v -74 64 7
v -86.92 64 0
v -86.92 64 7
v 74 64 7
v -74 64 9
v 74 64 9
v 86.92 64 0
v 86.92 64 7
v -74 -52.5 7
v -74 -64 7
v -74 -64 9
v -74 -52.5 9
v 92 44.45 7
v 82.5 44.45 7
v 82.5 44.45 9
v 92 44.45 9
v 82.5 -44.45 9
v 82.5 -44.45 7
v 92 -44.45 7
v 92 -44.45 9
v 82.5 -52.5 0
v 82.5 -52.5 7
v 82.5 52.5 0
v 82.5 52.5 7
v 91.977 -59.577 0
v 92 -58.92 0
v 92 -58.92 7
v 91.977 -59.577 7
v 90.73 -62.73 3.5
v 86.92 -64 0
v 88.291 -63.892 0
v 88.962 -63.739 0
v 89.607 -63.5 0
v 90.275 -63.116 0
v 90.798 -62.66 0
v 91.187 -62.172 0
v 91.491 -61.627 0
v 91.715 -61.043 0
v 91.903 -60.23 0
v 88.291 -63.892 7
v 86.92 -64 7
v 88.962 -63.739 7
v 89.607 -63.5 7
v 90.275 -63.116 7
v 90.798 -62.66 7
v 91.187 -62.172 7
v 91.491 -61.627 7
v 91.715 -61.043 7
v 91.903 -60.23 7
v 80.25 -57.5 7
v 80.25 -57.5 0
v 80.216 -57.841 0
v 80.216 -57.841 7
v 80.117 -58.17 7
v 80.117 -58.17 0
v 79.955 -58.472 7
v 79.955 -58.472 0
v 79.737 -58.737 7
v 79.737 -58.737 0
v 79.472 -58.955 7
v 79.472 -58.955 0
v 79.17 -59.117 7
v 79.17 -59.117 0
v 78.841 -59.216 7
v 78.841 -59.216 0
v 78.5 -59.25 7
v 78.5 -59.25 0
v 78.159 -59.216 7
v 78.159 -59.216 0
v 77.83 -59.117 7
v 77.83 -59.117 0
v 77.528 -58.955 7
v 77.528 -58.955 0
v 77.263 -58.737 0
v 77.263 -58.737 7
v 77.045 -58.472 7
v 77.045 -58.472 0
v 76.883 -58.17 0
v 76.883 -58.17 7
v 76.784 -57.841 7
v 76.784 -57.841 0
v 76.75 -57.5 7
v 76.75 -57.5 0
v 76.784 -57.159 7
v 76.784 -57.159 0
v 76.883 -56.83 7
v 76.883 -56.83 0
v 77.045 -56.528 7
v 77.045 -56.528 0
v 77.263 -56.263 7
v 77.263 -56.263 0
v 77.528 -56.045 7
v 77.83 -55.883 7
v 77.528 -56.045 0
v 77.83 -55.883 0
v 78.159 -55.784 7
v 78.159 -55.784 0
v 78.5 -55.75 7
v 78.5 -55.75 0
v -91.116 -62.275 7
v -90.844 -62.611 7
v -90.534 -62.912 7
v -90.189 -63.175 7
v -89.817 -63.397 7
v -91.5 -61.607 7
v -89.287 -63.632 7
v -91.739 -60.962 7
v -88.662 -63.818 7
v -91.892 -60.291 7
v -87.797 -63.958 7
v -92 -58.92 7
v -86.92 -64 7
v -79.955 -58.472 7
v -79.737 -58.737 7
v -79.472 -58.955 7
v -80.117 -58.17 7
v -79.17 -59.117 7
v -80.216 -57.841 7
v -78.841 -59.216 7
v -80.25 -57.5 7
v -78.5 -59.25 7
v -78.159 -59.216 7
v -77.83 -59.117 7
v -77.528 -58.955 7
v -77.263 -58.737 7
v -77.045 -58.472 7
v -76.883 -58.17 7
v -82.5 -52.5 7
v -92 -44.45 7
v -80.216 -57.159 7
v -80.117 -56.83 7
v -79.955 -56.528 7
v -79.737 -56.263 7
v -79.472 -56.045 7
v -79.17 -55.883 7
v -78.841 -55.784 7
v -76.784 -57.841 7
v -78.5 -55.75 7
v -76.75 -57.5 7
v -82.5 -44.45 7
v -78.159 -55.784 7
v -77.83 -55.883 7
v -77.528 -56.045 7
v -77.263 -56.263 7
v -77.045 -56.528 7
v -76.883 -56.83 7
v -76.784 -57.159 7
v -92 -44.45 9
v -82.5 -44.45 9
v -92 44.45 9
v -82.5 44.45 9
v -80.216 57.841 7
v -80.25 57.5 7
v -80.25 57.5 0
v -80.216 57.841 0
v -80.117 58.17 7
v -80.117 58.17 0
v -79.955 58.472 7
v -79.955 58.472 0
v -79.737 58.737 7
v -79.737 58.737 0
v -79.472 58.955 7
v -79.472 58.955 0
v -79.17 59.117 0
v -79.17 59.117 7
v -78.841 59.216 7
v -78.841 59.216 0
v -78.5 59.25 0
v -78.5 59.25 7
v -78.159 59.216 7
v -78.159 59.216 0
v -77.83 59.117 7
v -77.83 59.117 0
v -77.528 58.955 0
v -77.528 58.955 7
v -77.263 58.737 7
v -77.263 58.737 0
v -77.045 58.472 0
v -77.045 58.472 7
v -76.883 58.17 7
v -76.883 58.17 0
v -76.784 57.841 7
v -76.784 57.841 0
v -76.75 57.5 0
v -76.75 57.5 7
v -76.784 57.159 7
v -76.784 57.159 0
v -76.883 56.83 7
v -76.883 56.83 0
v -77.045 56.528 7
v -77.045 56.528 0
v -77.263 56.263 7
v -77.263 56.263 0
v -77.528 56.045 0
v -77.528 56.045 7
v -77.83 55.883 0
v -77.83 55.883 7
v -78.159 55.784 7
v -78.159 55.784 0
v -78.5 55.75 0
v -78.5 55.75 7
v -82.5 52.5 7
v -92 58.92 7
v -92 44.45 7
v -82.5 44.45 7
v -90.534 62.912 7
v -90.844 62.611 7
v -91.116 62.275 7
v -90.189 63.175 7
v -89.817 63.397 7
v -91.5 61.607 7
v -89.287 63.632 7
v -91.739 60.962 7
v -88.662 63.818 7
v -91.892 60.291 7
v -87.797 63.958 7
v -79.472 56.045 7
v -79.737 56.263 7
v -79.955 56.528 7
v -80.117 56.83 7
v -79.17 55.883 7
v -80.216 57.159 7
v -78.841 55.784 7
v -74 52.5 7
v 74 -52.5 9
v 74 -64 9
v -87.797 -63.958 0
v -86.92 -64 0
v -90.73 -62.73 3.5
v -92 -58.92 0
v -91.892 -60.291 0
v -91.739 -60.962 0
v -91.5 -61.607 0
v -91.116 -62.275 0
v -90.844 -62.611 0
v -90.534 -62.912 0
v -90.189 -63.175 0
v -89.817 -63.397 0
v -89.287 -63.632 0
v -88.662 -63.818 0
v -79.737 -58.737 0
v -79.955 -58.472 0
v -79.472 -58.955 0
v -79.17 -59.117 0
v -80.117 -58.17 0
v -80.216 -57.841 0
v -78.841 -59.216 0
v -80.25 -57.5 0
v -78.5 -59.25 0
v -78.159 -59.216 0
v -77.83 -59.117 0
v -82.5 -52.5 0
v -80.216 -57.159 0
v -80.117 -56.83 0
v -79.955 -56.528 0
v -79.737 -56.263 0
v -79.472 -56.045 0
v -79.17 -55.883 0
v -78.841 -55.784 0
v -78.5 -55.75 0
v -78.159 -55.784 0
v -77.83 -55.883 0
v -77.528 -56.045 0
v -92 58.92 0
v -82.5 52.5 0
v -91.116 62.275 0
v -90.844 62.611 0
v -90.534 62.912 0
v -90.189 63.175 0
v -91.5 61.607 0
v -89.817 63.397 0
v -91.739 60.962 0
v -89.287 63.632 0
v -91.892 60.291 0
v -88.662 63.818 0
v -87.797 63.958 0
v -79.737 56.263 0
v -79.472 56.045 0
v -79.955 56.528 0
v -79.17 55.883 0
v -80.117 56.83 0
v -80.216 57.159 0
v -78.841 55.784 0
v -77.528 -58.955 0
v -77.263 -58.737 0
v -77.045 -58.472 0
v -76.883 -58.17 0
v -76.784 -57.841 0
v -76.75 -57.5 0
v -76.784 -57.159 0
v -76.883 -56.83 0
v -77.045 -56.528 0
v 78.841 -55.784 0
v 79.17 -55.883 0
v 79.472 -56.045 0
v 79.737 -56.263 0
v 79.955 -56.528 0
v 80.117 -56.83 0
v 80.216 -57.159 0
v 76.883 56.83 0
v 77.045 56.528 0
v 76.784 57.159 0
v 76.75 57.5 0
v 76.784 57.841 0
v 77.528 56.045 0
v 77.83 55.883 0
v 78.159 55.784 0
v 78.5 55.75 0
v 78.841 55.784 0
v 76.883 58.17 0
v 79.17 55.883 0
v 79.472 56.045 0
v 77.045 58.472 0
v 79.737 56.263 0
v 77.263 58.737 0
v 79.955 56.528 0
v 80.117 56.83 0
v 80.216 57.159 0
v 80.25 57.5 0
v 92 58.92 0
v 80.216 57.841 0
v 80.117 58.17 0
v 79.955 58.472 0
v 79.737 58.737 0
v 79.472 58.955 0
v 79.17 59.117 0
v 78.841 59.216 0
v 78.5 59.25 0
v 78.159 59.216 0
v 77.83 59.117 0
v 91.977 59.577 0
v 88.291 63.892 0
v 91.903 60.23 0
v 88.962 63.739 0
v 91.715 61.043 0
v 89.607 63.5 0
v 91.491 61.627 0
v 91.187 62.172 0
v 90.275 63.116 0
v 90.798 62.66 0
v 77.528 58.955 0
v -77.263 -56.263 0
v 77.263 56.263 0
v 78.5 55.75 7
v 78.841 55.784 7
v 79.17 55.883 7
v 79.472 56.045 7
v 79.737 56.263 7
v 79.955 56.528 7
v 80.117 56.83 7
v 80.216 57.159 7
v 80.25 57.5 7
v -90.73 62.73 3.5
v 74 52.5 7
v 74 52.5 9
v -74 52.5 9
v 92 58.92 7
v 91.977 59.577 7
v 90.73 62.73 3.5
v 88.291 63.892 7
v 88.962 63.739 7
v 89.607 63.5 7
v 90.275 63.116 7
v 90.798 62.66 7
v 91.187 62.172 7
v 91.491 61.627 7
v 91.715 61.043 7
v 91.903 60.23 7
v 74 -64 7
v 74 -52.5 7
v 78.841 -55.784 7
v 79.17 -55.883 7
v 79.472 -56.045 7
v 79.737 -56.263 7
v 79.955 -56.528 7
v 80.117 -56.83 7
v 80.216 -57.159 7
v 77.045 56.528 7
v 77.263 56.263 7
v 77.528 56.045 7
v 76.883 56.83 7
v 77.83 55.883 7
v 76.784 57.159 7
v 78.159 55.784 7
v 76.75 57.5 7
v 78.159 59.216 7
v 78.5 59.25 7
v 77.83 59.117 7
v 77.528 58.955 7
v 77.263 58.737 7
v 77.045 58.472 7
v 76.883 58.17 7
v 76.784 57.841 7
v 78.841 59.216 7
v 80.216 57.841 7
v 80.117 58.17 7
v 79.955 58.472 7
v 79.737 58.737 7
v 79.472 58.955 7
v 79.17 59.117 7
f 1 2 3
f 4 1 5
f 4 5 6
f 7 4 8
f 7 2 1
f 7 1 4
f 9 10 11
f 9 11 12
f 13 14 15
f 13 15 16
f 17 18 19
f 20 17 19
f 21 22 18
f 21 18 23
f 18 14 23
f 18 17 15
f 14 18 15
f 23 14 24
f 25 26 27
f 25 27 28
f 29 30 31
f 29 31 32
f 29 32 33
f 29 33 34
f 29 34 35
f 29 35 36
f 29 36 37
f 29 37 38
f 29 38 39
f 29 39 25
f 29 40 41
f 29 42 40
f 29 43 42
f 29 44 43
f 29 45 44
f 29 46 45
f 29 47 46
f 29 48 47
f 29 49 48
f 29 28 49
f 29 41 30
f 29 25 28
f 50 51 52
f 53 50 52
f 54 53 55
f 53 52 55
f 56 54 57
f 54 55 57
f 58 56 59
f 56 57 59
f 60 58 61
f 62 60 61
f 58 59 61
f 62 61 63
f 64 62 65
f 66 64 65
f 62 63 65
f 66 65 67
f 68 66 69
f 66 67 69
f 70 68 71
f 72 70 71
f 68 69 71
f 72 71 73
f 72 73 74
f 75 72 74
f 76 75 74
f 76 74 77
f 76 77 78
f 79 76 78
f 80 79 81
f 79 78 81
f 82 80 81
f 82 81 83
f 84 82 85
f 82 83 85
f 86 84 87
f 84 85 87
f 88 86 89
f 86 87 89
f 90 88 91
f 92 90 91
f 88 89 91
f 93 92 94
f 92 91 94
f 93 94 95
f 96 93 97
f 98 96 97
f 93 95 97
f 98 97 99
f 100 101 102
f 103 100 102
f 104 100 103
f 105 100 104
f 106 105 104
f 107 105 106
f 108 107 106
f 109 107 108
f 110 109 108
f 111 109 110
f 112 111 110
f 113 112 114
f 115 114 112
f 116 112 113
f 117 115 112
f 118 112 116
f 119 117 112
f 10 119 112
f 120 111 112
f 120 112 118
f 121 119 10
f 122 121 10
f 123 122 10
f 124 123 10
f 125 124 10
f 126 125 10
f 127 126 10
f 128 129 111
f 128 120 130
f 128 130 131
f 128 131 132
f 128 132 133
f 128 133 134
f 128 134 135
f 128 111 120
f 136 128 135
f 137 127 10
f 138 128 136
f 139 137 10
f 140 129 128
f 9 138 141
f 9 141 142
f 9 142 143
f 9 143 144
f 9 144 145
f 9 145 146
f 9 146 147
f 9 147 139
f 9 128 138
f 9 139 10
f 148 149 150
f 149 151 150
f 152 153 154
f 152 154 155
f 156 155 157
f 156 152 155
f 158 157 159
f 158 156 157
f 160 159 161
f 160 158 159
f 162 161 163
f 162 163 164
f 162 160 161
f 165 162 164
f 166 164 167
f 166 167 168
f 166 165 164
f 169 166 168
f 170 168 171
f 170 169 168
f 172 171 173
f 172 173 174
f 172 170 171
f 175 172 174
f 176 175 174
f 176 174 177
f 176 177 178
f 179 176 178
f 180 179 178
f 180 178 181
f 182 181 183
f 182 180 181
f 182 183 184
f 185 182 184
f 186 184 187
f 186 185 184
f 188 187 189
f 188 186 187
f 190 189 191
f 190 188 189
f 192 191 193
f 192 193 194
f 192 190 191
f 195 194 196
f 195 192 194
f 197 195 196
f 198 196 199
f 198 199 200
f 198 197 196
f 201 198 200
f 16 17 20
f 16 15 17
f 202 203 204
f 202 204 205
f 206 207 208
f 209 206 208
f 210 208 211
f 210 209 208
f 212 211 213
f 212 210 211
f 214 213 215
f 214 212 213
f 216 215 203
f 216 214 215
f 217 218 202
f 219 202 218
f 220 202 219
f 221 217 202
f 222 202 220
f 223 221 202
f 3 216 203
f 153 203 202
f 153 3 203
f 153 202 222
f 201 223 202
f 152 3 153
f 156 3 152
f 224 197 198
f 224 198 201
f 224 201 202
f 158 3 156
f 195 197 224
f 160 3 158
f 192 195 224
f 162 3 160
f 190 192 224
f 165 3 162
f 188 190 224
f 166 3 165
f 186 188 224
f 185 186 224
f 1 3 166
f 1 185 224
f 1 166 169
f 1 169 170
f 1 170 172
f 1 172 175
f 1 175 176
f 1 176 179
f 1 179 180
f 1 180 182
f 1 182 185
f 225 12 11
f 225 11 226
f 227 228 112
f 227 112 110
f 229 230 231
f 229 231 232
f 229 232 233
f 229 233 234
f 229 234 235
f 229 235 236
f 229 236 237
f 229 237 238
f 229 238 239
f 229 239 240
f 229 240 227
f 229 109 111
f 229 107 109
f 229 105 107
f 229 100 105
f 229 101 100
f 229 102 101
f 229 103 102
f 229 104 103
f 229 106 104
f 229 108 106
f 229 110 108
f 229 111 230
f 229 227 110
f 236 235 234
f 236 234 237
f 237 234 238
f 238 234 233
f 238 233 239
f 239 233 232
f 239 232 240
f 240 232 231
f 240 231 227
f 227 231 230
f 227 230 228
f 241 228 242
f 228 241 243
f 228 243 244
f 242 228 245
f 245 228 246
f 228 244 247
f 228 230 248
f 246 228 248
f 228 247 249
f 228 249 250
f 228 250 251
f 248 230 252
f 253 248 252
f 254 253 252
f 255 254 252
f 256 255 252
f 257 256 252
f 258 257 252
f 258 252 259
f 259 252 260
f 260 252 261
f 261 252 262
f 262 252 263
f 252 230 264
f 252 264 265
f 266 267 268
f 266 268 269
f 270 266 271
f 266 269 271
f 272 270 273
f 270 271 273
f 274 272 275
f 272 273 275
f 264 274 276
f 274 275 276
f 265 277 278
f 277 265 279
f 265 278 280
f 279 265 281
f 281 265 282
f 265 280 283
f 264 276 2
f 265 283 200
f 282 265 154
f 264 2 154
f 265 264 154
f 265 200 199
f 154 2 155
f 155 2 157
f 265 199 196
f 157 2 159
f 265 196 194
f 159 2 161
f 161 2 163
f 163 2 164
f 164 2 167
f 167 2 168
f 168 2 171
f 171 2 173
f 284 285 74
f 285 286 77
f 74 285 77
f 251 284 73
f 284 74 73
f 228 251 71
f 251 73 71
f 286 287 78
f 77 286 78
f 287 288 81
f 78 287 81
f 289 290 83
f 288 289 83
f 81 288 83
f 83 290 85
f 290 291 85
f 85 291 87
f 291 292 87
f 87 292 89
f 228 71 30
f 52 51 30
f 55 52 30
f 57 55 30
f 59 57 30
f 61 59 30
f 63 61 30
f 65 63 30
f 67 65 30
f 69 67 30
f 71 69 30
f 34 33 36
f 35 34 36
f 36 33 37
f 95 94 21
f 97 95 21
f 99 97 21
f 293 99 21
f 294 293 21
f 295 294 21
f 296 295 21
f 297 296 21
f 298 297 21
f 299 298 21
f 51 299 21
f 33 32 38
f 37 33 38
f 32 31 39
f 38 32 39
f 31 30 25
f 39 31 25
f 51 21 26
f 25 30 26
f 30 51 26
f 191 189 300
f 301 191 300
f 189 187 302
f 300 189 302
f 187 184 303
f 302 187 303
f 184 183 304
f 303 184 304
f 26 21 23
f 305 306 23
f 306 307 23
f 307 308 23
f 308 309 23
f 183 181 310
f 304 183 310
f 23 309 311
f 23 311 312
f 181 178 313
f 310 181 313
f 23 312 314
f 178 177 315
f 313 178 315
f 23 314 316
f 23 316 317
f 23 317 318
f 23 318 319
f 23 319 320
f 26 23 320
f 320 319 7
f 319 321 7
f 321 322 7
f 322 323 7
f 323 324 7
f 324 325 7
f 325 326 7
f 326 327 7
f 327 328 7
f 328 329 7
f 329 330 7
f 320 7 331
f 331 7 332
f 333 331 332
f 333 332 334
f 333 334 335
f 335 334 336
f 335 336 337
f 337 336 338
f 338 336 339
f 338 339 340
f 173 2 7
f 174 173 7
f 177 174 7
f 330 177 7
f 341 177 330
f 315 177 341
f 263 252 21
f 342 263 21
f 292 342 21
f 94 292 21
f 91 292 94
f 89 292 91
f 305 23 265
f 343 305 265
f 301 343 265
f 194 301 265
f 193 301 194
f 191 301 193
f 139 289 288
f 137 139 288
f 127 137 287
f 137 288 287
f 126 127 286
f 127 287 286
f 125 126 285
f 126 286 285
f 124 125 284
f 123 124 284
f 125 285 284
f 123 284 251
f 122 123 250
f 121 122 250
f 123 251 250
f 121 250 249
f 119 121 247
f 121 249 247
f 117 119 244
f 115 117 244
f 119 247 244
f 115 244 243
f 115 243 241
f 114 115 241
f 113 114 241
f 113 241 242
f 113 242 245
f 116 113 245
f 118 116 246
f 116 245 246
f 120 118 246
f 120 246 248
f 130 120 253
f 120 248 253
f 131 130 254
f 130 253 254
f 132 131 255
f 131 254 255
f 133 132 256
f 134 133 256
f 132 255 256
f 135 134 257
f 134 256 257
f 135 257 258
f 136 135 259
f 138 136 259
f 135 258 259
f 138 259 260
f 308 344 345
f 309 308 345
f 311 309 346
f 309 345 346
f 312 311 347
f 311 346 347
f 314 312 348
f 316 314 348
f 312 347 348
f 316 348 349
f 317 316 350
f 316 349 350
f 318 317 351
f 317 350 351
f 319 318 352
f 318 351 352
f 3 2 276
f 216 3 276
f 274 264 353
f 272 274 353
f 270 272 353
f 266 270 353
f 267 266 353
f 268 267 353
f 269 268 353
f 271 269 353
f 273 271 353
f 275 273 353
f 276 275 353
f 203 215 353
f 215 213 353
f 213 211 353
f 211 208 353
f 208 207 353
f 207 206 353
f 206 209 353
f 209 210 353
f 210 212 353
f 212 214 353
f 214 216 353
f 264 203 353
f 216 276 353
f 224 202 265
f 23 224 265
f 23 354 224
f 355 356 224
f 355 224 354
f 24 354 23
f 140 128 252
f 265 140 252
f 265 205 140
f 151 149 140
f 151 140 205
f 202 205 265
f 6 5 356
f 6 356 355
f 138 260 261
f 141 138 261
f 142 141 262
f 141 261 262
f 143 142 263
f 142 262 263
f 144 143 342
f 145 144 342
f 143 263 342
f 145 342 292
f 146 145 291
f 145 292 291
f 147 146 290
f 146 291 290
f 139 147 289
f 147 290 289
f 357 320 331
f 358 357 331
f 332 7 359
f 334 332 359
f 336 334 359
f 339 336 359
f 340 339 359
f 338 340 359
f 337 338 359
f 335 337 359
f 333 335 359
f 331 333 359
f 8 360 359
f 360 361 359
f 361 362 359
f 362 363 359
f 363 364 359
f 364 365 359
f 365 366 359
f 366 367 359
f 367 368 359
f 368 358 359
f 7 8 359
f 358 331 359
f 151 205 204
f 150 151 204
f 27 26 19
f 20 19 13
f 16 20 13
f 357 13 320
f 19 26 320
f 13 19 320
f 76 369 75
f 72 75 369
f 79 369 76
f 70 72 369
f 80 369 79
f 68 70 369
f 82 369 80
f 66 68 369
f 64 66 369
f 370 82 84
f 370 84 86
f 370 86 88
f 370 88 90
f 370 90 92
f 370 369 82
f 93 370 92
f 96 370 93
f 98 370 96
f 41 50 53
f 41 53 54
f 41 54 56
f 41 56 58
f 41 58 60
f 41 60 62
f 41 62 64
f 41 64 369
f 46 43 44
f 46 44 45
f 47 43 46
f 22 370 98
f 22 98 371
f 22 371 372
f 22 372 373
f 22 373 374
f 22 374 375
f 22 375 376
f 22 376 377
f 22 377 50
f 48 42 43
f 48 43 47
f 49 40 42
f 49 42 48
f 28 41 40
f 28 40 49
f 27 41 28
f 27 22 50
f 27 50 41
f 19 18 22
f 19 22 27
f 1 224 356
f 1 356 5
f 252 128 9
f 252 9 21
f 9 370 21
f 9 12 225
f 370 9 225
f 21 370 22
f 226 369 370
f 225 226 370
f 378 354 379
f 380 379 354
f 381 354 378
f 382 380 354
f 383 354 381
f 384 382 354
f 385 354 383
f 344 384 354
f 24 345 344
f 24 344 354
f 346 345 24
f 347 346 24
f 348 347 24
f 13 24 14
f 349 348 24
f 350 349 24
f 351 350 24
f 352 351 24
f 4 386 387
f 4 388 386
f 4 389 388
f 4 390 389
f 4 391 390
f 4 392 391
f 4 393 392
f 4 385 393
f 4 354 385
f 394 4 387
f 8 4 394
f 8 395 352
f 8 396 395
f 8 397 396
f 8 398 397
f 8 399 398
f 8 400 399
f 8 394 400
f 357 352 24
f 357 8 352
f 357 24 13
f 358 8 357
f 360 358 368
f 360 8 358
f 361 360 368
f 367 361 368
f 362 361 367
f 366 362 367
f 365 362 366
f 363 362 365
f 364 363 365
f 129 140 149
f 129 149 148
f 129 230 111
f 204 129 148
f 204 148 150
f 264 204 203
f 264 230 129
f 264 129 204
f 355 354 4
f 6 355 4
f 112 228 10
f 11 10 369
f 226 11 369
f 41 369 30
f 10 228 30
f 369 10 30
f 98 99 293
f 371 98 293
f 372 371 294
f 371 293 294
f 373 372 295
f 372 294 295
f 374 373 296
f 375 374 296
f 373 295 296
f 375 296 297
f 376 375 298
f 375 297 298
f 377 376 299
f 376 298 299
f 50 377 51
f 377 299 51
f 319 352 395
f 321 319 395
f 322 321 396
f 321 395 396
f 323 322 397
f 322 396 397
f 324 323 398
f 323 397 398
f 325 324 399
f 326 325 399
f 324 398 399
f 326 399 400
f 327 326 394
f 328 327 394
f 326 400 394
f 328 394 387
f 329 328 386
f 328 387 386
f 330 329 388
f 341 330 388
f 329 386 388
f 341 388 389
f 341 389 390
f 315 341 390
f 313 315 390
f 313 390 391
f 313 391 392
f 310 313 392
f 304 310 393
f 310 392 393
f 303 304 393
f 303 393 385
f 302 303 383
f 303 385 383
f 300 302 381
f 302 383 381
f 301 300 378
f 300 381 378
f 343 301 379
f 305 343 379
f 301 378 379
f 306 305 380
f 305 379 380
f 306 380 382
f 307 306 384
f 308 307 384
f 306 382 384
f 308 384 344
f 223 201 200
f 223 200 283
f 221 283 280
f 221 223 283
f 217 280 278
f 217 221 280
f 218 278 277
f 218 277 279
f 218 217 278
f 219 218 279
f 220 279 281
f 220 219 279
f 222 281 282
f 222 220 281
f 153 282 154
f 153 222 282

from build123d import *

# Parameters (mm, degrees)
F0_W        = 184
F0_H        = 128
F1_DEPTH    = 7
F2_W        = 165
F2_H        = 105
F3_DEPTH    = 7
F4_W        = 74
F4_H        = 11.5
F5_DEPTH    = 2
F6_T1_DEPTH = 32.4
F7_W        = 9.5
F7_H        = 44.45
F8_DEPTH    = 2
F10_DEPTH   = 7
F12_DEPTH   = 7


# Not quite as in the source:
# - a fillet or chamfer that OpenCascade refuses, or shapes differently, is made with other operations: its cross-section is extruded or revolved along the edge and cut away or added
# - a pattern or mirror of a feature is missing from the dataset's text; its kind, count and spacing are read off the source's solid


with BuildPart() as f1:
    # F0 (on Top) → F1 (new body)
    with BuildSketch(Plane.XY):
        Rectangle(F0_W, F0_H)
    extrude(amount=F1_DEPTH)

    # F2 (on face) → F3 (cut, through all)
    with BuildSketch(Plane.XY.offset(7)):
        Rectangle(F2_W, F2_H)
    extrude(amount=-F3_DEPTH, mode=Mode.SUBTRACT)

    # F4 (on face) → F5 (join)
    with BuildSketch(Plane.XY.offset(7)):
        with Locations((-37, 58.25)):
            Rectangle(F4_W, F4_H)
        with Locations((37, 58.25)):
            Rectangle(F4_W, F4_H)
        with Locations((-37, -58.25)):
            Rectangle(F4_W, F4_H)
        with Locations((37, -58.25)):
            Rectangle(F4_W, F4_H)
    extrude(amount=F5_DEPTH)

    # F6: fillet of radius 5.08 on 4 edges, made by hand

    # F6_s2 → F6_t1 (cut)
    with BuildSketch(Plane.XY.offset(-12.7)):
        with BuildLine():
            add(Edge.make_bspline(
                [(92, -58.92), (92, -64), (86.92, -64)],
                knots=[0, 0, 0, 1, 1, 1], degree=2, weights=[1, 1, 1]))
            Line((86.92, -64), (92, -64))
            Line((92, -64), (92, -58.92))
        make_face()
        with BuildLine():
            add(Edge.make_bspline(
                [(92, 58.92), (92, 64), (86.92, 64)],
                knots=[0, 0, 0, 1, 1, 1], degree=2, weights=[1, 1, 1]))
            Line((86.92, 64), (92, 64))
            Line((92, 64), (92, 58.92))
        make_face()
        with BuildLine():
            add(Edge.make_bspline(
                [(-86.92, 64), (-92, 64), (-92, 58.92)],
                knots=[0, 0, 0, 1, 1, 1], degree=2, weights=[1, 1, 1]))
            Line((-92, 58.92), (-92, 64))
            Line((-92, 64), (-86.92, 64))
        make_face()
        with BuildLine():
            add(Edge.make_bspline(
                [(-86.92, -64), (-92, -64), (-92, -58.92)],
                knots=[0, 0, 0, 1, 1, 1], degree=2, weights=[1, 1, 1]))
            Line((-92, -58.92), (-92, -64))
            Line((-92, -64), (-86.92, -64))
        make_face()
    extrude(amount=F6_T1_DEPTH, mode=Mode.SUBTRACT)

    # F7 (on face) → F8 (join)
    with BuildSketch(Plane.XY.offset(7)):
        with Locations((87.25, -22.225)):
            Rectangle(F7_W, F7_H)
        with Locations((87.25, 22.225)):
            Rectangle(F7_W, F7_H)
    f8 = extrude(amount=F8_DEPTH)

    # F8_copies: F8 across plane
    add(f8.mirror(Plane(origin=(0, 0, 0), x_dir=(0, 0, -1), z_dir=(-1, 0, 0))))

    # F9 (on face) → F10 (cut, through all)
    with BuildSketch(Plane.XY.offset(7)):
        with BuildLine():
            ThreePointArc((80.25, 57.5), (77.2625631329, 58.7374368671), (78.5, 55.75))
            ThreePointArc((78.5, 55.75), (79.7374368671, 56.2625631329), (80.25, 57.5))
        make_face()
    f10 = extrude(amount=-F10_DEPTH, mode=Mode.SUBTRACT)

    # F10_copies: F10 across plane
    add(f10.mirror(Plane(origin=(0, 0, 0), x_dir=(0, 0, -1), z_dir=(-1, 0, 0))), mode=Mode.SUBTRACT)

    # F11 (on face) → F12 (cut, through all)
    with BuildSketch(Plane(origin=(0, 0, 0), x_dir=(1, 0, 0), z_dir=(0, 0, -1))):
        with BuildLine():
            ThreePointArc((-76.75, 57.5), (-79.7374368671, 58.7374368671), (-78.5, 55.75))
            ThreePointArc((-78.5, 55.75), (-77.2625631329, 56.2625631329), (-76.75, 57.5))
        make_face()
        with BuildLine():
            ThreePointArc((80.25, 57.5), (77.2625631329, 58.7374368671), (78.5, 55.75))
            ThreePointArc((78.5, 55.75), (79.7374368671, 56.2625631329), (80.25, 57.5))
        make_face()
    extrude(amount=-F12_DEPTH, mode=Mode.SUBTRACT)


solid = f1.part
